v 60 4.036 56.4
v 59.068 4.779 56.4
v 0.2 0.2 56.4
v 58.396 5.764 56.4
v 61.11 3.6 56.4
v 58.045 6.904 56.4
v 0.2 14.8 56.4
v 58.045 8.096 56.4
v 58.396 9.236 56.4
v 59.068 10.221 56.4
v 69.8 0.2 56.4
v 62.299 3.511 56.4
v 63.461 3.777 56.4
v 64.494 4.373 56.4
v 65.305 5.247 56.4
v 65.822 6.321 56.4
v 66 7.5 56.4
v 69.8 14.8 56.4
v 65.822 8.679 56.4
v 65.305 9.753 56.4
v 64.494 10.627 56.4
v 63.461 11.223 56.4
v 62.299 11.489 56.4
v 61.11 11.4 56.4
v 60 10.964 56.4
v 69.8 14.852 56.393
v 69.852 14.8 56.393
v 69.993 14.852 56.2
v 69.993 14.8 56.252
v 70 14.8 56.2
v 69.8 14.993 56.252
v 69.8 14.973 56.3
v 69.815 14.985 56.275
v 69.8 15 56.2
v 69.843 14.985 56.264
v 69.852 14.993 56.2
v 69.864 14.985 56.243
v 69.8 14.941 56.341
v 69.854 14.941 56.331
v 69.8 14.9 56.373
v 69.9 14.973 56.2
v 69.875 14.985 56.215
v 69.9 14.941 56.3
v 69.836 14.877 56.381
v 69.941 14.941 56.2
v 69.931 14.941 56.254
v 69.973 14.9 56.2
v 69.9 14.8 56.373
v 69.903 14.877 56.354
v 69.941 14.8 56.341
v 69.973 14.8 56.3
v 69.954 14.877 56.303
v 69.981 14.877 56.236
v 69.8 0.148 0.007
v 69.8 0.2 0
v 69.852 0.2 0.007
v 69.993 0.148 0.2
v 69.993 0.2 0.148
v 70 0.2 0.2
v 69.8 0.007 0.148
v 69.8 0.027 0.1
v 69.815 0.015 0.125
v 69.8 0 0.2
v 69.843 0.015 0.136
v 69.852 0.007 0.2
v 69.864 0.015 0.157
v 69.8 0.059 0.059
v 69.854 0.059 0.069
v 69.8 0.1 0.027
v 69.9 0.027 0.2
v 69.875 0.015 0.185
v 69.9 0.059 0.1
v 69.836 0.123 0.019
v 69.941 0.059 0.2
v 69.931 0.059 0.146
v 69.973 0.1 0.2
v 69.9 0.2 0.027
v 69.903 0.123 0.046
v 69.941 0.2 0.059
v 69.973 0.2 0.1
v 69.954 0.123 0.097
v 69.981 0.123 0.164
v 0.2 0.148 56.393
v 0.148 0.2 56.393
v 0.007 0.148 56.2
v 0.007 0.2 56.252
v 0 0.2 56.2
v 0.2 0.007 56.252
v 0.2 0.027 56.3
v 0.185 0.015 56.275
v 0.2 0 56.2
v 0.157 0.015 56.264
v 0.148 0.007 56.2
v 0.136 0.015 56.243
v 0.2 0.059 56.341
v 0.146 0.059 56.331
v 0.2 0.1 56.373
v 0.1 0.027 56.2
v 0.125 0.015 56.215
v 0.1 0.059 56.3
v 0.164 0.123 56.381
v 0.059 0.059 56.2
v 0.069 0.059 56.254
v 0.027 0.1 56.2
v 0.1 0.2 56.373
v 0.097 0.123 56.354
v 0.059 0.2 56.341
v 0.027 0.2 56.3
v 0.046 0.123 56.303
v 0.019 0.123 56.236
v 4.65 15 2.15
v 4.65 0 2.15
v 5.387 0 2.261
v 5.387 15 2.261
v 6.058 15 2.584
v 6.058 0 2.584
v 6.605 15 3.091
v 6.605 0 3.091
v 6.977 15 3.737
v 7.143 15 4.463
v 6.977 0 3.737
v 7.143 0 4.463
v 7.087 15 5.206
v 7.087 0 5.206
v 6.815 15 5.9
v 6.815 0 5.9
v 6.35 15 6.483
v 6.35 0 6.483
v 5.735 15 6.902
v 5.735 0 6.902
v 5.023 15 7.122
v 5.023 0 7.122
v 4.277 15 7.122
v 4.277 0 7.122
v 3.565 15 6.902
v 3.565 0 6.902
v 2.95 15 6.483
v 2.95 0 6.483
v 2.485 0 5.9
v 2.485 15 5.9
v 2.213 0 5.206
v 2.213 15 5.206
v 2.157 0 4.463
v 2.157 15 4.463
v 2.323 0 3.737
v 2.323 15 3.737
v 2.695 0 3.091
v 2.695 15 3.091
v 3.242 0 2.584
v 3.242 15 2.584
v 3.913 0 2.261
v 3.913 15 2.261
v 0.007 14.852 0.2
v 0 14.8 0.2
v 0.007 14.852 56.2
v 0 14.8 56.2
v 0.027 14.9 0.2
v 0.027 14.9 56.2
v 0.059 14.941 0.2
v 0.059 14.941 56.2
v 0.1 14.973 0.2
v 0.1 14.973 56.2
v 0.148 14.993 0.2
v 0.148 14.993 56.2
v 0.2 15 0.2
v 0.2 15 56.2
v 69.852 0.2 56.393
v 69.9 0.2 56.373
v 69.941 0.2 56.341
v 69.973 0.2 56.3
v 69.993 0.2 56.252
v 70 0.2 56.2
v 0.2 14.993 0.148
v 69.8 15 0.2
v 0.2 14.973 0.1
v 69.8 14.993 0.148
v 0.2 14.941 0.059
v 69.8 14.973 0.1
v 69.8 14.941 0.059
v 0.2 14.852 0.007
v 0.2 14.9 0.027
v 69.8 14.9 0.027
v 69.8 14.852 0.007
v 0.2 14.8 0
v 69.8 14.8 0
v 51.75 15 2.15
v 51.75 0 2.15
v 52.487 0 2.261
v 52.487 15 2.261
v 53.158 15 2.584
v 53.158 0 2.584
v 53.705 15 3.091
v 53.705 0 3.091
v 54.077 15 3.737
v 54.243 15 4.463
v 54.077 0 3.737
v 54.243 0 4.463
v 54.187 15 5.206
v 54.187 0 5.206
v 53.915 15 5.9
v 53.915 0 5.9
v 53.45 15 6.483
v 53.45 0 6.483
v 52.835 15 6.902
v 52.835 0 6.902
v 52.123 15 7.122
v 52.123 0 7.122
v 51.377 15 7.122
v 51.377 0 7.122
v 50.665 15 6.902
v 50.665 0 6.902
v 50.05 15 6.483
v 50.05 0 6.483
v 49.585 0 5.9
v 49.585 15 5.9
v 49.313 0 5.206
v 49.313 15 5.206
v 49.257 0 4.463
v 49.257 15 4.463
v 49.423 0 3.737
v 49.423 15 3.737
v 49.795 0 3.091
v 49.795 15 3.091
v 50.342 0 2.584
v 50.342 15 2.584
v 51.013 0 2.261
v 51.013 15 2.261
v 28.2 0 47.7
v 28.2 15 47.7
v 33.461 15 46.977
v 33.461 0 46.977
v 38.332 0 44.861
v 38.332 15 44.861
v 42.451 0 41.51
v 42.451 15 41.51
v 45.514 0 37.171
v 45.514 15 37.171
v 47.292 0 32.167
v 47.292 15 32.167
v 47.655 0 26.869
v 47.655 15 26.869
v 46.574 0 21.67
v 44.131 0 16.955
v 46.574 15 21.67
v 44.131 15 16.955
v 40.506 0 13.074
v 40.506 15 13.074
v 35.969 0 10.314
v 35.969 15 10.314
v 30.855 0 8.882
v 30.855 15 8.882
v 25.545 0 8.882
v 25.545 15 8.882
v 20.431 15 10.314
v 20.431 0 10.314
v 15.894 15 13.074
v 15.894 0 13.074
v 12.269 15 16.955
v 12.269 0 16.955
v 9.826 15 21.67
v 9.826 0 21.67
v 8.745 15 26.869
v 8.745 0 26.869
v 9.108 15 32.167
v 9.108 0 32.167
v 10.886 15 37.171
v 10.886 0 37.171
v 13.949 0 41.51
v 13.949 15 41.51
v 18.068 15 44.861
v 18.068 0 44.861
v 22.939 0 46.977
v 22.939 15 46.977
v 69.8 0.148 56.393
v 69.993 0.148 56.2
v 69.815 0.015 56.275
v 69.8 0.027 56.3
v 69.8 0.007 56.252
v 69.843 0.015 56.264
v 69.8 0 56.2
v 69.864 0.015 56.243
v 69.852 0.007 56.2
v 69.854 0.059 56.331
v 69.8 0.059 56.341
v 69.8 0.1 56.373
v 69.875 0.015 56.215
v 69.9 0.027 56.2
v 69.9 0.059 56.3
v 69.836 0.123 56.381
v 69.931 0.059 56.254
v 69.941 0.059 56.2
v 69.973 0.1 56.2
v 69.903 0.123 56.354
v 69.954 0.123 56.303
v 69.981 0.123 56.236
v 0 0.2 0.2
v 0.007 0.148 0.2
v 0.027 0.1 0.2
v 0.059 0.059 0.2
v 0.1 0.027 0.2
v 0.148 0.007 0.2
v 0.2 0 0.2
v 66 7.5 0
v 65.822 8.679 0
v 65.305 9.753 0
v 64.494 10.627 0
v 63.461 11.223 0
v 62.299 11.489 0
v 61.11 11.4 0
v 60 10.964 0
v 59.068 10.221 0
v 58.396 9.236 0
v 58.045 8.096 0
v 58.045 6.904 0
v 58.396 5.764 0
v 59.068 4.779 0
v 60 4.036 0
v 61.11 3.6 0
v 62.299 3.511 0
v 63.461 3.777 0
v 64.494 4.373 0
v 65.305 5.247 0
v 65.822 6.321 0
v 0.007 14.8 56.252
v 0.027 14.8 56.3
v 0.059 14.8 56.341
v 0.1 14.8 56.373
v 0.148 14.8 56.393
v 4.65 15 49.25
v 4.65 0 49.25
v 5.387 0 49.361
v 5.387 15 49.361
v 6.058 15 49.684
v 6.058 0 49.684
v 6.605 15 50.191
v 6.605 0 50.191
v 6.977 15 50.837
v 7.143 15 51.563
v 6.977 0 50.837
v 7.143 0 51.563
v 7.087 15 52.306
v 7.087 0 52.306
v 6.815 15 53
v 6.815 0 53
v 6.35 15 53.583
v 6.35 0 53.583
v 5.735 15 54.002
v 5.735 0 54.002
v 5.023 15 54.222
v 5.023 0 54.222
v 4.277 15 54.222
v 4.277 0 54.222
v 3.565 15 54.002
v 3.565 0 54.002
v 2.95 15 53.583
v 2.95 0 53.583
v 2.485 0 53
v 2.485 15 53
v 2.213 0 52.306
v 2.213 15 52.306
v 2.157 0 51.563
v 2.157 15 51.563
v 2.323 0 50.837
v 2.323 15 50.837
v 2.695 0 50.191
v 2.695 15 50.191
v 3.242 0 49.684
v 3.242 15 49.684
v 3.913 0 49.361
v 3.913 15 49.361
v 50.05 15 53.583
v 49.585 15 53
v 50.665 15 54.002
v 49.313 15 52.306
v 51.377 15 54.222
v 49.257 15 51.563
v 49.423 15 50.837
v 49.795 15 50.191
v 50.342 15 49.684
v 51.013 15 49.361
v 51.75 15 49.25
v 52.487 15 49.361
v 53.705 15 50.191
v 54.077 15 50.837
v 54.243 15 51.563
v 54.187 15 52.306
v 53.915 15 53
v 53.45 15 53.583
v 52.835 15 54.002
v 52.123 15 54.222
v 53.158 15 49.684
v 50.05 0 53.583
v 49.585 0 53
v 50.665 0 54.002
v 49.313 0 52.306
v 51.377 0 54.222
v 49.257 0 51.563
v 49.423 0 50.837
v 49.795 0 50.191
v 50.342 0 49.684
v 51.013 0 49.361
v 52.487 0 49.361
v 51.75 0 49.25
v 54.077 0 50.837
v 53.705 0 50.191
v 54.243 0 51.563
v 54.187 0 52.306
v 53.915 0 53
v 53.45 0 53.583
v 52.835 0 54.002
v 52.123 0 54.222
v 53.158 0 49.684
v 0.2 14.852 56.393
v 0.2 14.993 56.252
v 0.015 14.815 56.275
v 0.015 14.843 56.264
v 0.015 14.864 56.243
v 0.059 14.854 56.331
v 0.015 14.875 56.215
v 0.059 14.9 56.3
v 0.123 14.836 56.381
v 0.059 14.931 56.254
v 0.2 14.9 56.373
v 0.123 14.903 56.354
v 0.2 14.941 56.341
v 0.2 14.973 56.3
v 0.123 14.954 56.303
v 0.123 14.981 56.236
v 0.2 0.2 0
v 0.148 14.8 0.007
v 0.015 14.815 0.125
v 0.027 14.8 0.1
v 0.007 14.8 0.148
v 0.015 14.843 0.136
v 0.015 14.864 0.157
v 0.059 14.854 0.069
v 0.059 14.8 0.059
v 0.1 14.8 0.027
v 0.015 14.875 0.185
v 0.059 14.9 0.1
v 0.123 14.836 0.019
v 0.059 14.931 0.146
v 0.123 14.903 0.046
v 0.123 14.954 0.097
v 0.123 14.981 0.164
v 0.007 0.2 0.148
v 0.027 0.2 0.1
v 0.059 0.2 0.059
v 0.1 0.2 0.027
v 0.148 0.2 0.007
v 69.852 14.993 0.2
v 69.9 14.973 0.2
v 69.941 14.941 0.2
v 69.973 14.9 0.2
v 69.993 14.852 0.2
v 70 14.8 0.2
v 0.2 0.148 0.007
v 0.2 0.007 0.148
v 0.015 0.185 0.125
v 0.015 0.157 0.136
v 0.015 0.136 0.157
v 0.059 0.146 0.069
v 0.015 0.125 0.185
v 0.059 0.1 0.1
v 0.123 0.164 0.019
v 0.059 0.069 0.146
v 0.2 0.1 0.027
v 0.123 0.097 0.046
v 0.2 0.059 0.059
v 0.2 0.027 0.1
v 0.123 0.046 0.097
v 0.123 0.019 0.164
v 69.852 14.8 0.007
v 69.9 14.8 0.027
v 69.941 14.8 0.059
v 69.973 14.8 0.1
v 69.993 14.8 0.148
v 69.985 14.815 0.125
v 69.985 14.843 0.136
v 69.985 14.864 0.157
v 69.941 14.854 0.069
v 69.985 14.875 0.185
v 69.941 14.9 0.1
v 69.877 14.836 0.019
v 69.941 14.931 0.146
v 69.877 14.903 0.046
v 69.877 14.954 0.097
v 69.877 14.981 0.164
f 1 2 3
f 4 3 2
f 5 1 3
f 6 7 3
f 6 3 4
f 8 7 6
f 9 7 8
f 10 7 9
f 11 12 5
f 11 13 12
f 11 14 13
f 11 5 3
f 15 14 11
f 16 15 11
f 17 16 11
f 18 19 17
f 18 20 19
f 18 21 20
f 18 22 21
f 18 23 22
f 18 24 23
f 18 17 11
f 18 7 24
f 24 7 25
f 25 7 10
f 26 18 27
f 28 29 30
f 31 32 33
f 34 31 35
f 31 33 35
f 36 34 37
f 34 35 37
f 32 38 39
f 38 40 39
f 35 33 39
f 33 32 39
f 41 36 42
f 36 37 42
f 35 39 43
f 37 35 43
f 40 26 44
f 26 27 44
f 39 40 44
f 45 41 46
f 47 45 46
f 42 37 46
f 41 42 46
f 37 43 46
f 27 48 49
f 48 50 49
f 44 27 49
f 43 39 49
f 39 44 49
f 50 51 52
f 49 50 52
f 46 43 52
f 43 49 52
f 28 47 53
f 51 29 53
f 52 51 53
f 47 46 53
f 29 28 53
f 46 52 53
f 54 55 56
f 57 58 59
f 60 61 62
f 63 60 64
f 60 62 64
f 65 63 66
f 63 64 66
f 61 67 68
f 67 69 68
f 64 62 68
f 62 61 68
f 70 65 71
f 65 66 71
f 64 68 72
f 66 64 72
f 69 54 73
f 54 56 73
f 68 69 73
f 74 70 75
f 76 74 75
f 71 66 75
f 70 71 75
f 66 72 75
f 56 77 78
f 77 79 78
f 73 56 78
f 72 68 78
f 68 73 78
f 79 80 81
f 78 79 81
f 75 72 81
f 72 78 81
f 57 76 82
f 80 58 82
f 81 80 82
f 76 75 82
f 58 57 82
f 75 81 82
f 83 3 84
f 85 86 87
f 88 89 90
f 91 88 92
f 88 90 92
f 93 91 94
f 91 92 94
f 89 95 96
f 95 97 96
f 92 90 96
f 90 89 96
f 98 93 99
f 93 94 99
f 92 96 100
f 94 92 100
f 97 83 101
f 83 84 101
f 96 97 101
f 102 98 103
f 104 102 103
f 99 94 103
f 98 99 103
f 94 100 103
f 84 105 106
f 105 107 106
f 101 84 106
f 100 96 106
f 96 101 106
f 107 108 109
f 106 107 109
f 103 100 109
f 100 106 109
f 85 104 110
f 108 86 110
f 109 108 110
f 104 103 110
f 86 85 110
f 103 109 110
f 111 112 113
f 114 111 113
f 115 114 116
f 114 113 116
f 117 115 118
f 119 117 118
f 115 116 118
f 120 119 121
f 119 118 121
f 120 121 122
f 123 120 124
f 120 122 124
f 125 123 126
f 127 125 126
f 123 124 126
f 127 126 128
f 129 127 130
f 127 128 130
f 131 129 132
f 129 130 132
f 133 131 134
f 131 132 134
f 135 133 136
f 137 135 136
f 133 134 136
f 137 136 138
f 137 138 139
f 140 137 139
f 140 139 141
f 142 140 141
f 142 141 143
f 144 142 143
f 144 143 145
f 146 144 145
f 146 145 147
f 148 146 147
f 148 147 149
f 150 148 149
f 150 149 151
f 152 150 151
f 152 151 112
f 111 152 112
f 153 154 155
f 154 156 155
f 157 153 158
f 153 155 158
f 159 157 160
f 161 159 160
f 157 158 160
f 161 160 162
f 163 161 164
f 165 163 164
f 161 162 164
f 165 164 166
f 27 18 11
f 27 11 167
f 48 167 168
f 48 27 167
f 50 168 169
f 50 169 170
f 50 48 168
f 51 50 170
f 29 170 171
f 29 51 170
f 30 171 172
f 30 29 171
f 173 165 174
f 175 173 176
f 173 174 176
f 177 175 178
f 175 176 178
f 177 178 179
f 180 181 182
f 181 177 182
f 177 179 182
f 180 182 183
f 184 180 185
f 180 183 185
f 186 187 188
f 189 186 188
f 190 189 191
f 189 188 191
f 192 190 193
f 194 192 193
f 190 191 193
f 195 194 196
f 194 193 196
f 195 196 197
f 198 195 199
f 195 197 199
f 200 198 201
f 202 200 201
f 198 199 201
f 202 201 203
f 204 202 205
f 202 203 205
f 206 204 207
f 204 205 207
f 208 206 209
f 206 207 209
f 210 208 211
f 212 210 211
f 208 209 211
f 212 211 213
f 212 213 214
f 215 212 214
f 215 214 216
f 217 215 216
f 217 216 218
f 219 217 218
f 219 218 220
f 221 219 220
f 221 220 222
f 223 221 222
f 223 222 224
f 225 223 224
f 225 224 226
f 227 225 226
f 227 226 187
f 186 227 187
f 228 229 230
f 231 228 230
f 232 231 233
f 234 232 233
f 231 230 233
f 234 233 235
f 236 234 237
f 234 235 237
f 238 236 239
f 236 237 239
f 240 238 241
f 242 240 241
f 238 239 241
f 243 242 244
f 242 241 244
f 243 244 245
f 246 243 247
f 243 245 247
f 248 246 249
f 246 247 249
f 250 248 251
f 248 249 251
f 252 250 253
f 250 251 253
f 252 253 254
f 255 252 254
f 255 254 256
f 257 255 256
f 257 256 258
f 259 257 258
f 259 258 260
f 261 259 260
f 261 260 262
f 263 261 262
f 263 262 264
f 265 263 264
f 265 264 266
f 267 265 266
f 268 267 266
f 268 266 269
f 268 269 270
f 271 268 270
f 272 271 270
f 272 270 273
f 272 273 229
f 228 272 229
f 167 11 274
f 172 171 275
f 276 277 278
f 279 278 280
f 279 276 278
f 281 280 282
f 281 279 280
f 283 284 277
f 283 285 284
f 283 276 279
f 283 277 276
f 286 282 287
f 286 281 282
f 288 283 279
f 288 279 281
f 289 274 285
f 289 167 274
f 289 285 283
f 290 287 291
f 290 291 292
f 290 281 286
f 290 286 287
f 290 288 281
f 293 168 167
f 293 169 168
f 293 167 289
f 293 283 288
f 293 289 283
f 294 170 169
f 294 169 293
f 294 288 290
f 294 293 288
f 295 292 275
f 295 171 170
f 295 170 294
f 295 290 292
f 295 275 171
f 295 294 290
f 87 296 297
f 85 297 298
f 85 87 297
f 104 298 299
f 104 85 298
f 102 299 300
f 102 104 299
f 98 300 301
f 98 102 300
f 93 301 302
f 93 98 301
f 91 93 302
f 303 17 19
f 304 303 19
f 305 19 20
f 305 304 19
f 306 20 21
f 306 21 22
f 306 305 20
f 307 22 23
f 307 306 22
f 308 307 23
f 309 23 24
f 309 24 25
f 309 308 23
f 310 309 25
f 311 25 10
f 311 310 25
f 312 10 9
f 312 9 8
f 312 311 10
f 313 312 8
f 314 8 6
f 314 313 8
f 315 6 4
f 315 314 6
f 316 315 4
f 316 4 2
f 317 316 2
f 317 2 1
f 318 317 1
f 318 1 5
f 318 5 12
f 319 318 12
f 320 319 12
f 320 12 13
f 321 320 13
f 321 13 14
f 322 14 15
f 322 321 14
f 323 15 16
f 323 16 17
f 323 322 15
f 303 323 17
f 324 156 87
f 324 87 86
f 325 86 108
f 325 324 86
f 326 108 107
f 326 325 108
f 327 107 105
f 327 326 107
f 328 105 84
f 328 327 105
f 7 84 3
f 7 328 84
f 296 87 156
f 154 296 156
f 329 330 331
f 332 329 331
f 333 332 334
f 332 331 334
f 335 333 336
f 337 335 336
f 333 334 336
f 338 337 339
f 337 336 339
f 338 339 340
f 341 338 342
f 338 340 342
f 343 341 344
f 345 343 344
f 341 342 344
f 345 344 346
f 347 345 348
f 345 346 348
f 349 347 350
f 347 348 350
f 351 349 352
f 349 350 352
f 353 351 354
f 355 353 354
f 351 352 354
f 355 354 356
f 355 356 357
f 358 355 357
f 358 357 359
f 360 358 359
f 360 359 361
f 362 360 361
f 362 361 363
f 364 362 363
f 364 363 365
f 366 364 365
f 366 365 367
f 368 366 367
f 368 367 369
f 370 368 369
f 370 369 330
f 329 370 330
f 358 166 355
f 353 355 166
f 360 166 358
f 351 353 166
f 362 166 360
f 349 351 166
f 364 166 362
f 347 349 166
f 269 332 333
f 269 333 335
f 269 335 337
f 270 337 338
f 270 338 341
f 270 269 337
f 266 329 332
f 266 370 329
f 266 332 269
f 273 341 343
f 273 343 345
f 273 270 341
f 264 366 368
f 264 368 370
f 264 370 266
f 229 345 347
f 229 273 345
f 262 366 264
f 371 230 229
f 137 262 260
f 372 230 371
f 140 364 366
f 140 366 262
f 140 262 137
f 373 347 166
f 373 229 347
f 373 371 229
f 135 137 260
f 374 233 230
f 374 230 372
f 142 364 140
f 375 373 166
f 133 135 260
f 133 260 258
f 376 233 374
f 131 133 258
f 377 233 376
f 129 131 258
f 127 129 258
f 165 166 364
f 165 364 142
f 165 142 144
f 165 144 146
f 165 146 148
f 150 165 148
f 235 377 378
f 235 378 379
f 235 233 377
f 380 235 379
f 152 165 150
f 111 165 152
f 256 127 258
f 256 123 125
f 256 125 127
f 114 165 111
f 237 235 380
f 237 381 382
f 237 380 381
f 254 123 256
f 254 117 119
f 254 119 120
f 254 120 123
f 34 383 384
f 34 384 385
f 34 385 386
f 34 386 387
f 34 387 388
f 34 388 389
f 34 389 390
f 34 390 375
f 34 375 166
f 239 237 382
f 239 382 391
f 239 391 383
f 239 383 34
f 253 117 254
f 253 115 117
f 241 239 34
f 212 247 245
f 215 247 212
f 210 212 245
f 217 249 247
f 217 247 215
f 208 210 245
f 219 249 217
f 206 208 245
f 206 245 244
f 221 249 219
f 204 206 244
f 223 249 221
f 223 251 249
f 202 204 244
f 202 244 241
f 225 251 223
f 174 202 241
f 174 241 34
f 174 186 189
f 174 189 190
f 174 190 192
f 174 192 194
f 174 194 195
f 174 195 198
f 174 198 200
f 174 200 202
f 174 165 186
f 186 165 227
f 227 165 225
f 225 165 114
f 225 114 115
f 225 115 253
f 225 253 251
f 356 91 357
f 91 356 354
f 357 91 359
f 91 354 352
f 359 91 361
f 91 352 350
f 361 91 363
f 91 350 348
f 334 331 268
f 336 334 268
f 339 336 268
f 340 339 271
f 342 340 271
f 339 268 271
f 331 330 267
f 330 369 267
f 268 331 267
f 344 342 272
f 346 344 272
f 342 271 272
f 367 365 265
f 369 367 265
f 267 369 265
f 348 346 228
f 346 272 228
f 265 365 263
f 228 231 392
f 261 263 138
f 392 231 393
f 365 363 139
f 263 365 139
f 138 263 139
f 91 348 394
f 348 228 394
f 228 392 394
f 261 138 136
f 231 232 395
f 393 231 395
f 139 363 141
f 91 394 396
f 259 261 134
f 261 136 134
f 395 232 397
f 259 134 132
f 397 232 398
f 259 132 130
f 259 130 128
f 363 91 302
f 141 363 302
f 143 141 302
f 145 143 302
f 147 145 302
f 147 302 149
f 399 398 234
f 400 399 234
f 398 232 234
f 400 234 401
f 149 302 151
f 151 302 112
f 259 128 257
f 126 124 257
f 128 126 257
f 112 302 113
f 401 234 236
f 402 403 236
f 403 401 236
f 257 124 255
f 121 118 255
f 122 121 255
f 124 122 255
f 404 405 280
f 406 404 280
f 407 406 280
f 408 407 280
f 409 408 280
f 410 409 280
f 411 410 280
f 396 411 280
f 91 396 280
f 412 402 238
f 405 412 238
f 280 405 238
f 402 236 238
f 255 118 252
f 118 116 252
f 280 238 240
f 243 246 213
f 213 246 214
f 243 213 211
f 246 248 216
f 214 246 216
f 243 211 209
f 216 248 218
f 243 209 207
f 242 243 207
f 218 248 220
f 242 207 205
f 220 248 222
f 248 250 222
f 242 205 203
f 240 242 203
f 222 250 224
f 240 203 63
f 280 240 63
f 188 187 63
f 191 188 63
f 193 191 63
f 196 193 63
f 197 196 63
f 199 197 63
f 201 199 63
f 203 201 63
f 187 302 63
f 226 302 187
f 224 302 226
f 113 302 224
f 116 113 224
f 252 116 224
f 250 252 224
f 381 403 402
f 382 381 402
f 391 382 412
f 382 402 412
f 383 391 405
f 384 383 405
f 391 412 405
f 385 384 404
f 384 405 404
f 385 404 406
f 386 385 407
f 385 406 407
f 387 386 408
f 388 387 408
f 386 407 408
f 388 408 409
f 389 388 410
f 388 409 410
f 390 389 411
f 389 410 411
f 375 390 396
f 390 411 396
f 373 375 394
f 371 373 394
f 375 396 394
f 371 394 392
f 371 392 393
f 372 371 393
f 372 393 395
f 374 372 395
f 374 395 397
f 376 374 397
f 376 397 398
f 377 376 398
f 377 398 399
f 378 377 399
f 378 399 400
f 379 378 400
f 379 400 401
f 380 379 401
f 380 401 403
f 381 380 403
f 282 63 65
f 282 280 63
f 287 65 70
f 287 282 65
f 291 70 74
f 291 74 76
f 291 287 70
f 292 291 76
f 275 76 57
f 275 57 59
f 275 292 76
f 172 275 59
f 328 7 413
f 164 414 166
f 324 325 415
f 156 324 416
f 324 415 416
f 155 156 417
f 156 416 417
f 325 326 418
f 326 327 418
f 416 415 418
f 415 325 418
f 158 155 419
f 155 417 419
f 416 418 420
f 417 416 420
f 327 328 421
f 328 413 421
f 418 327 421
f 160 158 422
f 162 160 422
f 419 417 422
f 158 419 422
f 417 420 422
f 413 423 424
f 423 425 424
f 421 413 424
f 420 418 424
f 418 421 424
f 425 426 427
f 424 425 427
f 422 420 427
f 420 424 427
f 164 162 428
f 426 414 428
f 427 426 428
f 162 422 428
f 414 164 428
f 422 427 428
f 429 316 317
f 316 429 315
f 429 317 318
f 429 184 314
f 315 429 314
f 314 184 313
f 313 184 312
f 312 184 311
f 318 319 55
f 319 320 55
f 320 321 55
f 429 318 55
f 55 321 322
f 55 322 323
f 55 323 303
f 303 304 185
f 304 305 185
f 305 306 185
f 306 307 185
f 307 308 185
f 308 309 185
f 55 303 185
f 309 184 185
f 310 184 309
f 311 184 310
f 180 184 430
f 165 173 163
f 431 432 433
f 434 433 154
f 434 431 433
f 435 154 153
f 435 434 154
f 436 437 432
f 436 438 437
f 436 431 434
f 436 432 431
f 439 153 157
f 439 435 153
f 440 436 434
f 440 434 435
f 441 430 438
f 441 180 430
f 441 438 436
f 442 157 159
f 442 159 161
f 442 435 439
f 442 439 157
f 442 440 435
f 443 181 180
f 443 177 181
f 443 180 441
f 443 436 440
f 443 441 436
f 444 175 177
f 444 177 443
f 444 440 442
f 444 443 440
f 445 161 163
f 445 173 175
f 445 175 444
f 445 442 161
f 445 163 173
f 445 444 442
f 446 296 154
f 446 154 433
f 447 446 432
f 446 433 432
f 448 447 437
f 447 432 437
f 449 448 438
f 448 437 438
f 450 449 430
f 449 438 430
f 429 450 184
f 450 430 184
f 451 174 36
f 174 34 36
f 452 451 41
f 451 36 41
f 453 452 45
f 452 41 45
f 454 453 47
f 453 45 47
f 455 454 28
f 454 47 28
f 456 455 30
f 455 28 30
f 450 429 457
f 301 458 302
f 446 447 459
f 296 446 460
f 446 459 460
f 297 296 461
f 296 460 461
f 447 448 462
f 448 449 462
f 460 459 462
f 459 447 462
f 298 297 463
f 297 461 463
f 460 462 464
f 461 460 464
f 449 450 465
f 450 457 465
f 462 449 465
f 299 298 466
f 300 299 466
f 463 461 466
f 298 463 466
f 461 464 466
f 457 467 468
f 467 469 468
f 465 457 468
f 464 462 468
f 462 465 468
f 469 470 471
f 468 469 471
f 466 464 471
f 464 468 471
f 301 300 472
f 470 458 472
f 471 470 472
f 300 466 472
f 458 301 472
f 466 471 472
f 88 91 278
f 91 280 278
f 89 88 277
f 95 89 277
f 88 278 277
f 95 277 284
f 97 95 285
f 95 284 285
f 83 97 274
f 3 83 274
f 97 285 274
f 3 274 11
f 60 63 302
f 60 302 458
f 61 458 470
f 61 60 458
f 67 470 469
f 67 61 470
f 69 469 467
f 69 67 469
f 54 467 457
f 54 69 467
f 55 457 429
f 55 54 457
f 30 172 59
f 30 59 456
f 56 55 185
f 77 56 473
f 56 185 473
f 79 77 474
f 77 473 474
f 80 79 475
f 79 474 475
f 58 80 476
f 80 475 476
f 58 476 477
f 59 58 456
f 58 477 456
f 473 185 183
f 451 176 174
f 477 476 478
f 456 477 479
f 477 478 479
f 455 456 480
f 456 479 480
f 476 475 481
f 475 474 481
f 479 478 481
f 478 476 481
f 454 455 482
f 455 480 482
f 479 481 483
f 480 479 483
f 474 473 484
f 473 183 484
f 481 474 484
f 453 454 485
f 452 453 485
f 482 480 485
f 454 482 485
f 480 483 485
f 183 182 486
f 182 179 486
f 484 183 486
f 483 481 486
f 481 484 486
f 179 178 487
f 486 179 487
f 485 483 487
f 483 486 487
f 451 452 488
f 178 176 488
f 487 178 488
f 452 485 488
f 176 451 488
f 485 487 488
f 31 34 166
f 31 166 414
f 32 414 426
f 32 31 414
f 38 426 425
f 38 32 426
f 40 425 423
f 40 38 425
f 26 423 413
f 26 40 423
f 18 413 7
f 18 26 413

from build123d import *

# Parameters (mm, degrees)
SKETCH1_W           = 70
SKETCH1_H           = 15
SKETCH1_R           = 4
BOSS_EXTRUDE1_DEPTH = 56.4
SKETCH2_R           = 19.5
CUT_EXTRUDE1_DEPTH  = 42.3
SKETCH3_R           = 2.5
CUT_EXTRUDE2_DEPTH  = 92.137039671
FILLET1_R           = 0.2


with BuildPart() as part:
    # Sketch1 → Boss-Extrude1 (new body)
    with BuildSketch(Plane.XY):
        with Locations((35, 7.5)):
            Rectangle(SKETCH1_W, SKETCH1_H)
        with Locations((62, 7.5)):
            Circle(SKETCH1_R, mode=Mode.SUBTRACT)
    extrude(amount=BOSS_EXTRUDE1_DEPTH)

    # Sketch2 → Cut-Extrude1 (cut)
    with BuildSketch(Plane(origin=(0, 15, 0), x_dir=(1, 0, 0), z_dir=(0, 1, 0))):
        with Locations(Location((28.2, -28.2, 0), (0, 0, 270))):
            Circle(SKETCH2_R)
    extrude(amount=-CUT_EXTRUDE1_DEPTH, mode=Mode.SUBTRACT)

    # Sketch3 → Cut-Extrude2 (cut, through all)
    with BuildSketch(Plane(origin=(0, 0, 0), x_dir=(-1, 0, 0), z_dir=(0, -1, 0))):
        with Locations(Location((-51.75, -4.65, 0), (0, 0, 90))):
            Circle(SKETCH3_R)
        with Locations(Location((-4.65, -4.65, 0), (0, 0, 90))):
            Circle(SKETCH3_R)
        with Locations(Location((-4.65, -51.75, 0), (0, 0, 90))):
            Circle(SKETCH3_R)
        with Locations(Location((-51.75, -51.75, 0), (0, 0, 90))):
            Circle(SKETCH3_R)
    extrude(amount=-CUT_EXTRUDE2_DEPTH, mode=Mode.SUBTRACT)

    # Fillet1
    fillet1_edges = [part.edges().sort_by_distance(p)[0] for p in [
        (70, 7.5, 56.4),
        (35, 15, 56.4),
        (0, 7.5, 56.4),
        (35, 15, 0),
        (70, 7.5, 0),
        (35, 0, 0),
        (0, 7.5, 0),
        (35, 0, 56.4),
        (0, 15, 28.2),
        (70, 15, 28.2),
        (70, 0, 28.2),
        (0, 0, 28.2),
    ]]
    fillet(fillet1_edges, radius=FILLET1_R)


solid = part.part
